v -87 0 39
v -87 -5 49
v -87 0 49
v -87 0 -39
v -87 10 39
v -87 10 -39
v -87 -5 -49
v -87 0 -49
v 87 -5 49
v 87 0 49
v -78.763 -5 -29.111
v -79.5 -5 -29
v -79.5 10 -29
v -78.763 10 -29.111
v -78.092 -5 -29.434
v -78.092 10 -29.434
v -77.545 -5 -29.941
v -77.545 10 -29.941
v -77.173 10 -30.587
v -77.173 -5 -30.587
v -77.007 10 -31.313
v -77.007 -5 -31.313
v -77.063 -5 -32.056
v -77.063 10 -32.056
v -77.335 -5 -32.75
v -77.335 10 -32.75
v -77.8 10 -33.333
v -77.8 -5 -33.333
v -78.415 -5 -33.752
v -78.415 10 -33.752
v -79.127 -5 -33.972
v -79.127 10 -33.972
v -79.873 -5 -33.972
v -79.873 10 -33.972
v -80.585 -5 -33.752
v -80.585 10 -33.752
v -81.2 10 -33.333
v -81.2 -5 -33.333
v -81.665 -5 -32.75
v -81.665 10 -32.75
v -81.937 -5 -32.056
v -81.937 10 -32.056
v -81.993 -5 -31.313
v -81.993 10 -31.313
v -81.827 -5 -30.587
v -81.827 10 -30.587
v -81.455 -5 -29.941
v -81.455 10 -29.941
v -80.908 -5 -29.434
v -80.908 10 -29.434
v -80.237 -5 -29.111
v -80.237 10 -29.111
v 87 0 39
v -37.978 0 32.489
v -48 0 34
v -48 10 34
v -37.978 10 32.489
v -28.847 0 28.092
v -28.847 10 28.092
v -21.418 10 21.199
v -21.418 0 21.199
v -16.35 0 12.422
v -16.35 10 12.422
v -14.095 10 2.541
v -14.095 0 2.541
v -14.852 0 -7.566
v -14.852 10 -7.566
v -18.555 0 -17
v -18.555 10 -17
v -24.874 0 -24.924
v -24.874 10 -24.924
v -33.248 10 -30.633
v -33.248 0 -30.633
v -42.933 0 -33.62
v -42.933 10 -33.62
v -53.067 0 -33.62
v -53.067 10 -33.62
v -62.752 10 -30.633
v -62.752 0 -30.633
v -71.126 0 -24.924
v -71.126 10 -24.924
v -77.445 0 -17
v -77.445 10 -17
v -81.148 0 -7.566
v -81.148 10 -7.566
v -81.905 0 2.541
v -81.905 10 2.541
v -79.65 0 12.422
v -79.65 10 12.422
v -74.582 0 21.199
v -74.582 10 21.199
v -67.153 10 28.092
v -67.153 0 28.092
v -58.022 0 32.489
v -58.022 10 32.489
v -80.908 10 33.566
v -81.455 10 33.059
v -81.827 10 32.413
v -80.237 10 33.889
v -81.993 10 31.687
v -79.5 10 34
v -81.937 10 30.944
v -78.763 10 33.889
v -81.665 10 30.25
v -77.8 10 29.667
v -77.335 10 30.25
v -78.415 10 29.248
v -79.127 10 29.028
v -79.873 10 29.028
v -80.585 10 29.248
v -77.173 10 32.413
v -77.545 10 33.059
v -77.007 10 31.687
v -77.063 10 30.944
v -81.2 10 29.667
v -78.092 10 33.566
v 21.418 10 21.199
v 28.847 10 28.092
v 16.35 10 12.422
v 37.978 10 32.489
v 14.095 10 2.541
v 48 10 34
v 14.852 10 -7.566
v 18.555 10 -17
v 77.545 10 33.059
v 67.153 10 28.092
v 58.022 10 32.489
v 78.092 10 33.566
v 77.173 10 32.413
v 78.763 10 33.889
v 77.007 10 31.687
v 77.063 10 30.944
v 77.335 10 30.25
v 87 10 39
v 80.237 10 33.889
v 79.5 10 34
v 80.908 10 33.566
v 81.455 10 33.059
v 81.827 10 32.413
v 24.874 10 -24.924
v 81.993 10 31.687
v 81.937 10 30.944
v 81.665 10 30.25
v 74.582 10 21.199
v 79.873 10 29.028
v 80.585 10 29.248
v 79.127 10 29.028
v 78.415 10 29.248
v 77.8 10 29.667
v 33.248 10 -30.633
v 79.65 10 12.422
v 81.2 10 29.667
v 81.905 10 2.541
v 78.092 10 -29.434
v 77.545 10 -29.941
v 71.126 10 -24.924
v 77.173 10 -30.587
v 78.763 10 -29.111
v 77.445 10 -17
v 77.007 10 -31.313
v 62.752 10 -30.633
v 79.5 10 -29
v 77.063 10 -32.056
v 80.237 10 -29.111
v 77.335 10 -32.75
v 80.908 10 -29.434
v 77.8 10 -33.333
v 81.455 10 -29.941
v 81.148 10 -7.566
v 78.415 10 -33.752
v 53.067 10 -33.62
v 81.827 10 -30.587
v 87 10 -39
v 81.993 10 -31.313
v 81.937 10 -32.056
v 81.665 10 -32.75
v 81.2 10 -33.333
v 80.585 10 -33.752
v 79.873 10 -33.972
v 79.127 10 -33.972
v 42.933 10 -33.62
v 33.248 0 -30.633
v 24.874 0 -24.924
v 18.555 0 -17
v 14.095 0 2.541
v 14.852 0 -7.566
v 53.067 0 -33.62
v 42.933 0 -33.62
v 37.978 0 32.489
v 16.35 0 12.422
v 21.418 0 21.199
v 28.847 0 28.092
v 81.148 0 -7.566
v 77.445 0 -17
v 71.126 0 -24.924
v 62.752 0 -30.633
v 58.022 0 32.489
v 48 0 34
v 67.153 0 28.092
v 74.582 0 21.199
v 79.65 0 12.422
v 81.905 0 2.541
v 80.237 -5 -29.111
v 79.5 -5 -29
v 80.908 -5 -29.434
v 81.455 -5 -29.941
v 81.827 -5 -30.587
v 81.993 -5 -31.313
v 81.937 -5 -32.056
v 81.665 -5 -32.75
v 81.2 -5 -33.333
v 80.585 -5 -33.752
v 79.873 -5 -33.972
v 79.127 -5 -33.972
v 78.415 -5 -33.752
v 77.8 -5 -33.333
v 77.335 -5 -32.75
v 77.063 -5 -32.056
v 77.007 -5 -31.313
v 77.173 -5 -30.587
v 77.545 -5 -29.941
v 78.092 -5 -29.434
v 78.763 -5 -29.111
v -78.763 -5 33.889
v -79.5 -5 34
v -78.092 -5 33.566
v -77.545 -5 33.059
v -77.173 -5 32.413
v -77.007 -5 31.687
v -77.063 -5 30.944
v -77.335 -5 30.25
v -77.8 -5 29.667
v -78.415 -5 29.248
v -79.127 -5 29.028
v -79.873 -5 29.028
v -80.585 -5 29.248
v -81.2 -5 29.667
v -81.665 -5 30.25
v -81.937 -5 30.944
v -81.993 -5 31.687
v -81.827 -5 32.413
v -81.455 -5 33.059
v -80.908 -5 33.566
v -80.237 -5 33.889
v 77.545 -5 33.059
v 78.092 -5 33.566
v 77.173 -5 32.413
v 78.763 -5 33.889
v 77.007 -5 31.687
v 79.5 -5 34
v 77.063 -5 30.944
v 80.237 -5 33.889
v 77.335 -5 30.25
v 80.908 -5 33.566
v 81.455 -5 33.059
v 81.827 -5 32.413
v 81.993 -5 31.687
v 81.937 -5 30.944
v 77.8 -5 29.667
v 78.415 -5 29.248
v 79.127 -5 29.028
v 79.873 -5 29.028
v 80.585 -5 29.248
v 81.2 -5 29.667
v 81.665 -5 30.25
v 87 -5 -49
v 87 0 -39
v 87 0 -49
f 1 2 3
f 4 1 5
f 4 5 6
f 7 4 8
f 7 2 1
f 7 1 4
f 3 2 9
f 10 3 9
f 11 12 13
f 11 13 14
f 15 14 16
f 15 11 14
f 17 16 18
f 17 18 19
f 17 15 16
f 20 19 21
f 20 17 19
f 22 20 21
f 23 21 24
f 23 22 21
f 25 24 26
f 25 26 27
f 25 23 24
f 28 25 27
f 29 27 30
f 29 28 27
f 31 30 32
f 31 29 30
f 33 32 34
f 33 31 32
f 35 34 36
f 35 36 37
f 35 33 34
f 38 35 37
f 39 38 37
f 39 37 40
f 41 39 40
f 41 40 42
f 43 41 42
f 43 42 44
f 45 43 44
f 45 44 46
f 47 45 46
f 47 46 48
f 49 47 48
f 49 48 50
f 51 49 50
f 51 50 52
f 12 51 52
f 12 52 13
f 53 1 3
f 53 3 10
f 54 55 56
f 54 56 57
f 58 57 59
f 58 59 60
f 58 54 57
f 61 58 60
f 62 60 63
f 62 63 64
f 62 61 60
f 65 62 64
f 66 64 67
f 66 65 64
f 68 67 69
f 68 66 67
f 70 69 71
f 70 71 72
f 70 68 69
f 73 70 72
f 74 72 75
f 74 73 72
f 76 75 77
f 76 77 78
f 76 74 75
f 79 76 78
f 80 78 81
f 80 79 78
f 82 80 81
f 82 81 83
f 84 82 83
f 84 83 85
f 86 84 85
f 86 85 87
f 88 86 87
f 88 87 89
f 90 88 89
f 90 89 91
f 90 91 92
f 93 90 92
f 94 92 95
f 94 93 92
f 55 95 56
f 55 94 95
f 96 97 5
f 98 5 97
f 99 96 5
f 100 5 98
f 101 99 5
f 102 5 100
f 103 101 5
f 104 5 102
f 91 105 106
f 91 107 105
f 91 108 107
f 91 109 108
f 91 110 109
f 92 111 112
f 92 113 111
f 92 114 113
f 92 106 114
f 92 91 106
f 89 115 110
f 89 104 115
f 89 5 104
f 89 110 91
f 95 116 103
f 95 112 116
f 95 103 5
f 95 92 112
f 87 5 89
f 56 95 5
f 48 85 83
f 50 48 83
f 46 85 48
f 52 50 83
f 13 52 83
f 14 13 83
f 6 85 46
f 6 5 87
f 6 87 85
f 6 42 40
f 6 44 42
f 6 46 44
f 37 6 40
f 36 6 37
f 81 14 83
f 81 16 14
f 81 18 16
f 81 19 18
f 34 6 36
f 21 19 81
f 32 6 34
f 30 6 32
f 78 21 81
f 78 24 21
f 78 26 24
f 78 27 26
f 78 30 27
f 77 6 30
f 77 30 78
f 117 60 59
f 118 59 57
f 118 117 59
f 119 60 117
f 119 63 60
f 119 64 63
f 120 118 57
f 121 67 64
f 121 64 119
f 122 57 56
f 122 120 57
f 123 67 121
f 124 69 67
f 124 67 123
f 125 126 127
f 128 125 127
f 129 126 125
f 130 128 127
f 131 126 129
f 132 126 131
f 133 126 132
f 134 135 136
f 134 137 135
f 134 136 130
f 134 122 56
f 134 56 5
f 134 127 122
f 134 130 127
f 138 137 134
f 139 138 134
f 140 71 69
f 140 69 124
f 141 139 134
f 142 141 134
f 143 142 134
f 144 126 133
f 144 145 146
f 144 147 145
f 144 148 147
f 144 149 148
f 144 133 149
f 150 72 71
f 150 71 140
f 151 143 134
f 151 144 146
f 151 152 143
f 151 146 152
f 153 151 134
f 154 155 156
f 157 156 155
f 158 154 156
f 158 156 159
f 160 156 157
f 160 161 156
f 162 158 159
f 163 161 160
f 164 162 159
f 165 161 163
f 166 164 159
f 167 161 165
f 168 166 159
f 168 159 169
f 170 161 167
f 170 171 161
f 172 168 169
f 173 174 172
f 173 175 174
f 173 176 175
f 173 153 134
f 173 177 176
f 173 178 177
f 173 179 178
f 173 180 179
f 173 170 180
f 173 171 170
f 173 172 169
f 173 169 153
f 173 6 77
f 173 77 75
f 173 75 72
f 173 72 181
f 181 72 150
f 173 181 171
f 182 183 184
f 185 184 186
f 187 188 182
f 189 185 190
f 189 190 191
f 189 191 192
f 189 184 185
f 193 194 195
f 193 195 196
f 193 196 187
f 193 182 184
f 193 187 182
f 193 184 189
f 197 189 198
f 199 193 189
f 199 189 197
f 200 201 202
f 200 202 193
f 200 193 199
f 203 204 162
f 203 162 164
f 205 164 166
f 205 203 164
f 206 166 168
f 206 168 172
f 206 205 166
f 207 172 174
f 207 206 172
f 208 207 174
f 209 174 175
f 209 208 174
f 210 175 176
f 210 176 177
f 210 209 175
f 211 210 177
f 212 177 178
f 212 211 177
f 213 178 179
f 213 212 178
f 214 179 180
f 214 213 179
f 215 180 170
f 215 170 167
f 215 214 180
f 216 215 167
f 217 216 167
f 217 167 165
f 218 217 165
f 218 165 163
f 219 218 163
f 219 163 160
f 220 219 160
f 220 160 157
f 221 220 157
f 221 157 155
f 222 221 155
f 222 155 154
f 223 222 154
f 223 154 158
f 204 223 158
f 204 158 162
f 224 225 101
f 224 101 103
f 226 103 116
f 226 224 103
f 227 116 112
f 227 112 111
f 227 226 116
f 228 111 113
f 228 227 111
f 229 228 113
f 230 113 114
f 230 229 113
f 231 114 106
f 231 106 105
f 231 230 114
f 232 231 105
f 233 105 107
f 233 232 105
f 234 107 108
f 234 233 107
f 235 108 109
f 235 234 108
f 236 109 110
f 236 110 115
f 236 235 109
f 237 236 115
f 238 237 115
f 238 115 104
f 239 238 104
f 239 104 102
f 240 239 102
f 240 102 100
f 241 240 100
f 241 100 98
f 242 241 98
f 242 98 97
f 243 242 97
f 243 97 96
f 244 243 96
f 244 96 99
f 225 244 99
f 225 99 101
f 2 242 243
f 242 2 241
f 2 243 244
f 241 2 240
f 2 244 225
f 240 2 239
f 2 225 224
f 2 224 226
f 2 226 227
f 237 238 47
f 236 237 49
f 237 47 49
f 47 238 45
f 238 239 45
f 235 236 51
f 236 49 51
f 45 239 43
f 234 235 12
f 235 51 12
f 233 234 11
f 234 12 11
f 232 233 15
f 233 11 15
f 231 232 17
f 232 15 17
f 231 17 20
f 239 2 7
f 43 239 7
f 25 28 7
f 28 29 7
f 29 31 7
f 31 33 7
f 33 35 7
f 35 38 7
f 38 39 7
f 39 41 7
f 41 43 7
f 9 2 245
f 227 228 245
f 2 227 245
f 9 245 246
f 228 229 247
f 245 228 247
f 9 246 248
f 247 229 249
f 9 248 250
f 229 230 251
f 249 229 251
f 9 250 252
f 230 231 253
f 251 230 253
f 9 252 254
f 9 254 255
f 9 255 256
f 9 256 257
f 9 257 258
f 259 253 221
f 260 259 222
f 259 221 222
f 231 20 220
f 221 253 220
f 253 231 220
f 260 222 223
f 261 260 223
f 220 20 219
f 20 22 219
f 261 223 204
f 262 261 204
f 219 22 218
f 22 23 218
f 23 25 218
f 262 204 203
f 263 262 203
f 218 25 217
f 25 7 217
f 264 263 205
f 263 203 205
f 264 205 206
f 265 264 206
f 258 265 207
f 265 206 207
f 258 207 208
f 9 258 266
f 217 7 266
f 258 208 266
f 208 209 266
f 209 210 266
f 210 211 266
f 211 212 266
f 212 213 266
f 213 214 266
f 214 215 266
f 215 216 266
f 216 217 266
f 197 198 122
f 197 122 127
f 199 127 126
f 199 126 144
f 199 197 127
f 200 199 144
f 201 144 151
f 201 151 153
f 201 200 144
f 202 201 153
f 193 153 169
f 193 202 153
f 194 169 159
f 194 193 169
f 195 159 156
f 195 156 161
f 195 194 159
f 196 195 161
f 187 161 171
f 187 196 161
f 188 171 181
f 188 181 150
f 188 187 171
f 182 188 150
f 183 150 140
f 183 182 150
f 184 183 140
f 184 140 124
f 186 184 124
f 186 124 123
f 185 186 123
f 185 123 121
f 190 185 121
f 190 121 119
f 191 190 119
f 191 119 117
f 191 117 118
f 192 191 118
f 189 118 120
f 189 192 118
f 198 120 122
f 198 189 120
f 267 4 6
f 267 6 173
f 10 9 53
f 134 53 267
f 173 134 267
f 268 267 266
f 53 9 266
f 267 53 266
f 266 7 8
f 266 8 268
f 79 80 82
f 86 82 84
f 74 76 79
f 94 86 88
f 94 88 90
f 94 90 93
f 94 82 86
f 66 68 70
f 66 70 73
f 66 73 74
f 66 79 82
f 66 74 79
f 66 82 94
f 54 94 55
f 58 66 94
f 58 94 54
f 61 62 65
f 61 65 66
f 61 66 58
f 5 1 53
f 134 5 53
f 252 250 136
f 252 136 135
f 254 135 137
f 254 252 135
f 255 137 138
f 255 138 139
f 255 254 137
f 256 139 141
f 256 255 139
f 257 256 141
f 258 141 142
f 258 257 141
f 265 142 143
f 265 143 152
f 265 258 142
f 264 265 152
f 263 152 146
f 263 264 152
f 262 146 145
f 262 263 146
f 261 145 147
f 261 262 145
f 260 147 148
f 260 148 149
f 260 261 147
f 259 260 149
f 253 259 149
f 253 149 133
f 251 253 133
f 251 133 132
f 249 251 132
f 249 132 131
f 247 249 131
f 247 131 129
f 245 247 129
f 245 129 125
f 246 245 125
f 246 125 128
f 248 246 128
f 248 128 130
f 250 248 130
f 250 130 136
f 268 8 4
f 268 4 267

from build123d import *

# Parameters (mm, degrees)
SKETCH1_W           = 174
SKETCH1_H           = 78
SKETCH1_R           = 2.5
SKETCH1_R_2         = 34
BOSS_EXTRUDE1_DEPTH = 10
BOSS_EXTRUDE2_START = -5
SKETCH1_3_W         = 174
SKETCH1_3_H         = 98
SKETCH1_3_R         = 2.5
BOSS_EXTRUDE2_DEPTH = 5


with BuildPart() as part:
    # Sketch1 → Boss-Extrude1 (new body)
    with BuildSketch(Plane(origin=(0, 0, 0), x_dir=(1, 0, 0), z_dir=(0, 1, 0))):
        Rectangle(SKETCH1_W, SKETCH1_H)
        with Locations((-79.5, -31.5)):
            Circle(SKETCH1_R, mode=Mode.SUBTRACT)
        with Locations((-48, 0)):
            Circle(SKETCH1_R_2, mode=Mode.SUBTRACT)
        with Locations((79.5, -31.5)):
            Circle(SKETCH1_R, mode=Mode.SUBTRACT)
        with Locations((48, 0)):
            Circle(SKETCH1_R_2, mode=Mode.SUBTRACT)
        with Locations((-79.5, 31.5)):
            Circle(SKETCH1_R, mode=Mode.SUBTRACT)
        with Locations((79.5, 31.5)):
            Circle(SKETCH1_R, mode=Mode.SUBTRACT)
    extrude(amount=BOSS_EXTRUDE1_DEPTH)

    # Sketch1<3> → Boss-Extrude2 (add)
    with BuildSketch(Plane(origin=(0, 0, 0), x_dir=(1, 0, 0), z_dir=(0, 1, 0)).offset(BOSS_EXTRUDE2_START)):
        Rectangle(SKETCH1_3_W, SKETCH1_3_H)
        with Locations((79.5, 31.5)):
            Circle(SKETCH1_3_R, mode=Mode.SUBTRACT)
        with Locations((-79.5, -31.5)):
            Circle(SKETCH1_3_R, mode=Mode.SUBTRACT)
        with Locations((79.5, -31.5)):
            Circle(SKETCH1_3_R, mode=Mode.SUBTRACT)
        with Locations((-79.5, 31.5)):
            Circle(SKETCH1_3_R, mode=Mode.SUBTRACT)
    extrude(amount=BOSS_EXTRUDE2_DEPTH)


solid = part.part
